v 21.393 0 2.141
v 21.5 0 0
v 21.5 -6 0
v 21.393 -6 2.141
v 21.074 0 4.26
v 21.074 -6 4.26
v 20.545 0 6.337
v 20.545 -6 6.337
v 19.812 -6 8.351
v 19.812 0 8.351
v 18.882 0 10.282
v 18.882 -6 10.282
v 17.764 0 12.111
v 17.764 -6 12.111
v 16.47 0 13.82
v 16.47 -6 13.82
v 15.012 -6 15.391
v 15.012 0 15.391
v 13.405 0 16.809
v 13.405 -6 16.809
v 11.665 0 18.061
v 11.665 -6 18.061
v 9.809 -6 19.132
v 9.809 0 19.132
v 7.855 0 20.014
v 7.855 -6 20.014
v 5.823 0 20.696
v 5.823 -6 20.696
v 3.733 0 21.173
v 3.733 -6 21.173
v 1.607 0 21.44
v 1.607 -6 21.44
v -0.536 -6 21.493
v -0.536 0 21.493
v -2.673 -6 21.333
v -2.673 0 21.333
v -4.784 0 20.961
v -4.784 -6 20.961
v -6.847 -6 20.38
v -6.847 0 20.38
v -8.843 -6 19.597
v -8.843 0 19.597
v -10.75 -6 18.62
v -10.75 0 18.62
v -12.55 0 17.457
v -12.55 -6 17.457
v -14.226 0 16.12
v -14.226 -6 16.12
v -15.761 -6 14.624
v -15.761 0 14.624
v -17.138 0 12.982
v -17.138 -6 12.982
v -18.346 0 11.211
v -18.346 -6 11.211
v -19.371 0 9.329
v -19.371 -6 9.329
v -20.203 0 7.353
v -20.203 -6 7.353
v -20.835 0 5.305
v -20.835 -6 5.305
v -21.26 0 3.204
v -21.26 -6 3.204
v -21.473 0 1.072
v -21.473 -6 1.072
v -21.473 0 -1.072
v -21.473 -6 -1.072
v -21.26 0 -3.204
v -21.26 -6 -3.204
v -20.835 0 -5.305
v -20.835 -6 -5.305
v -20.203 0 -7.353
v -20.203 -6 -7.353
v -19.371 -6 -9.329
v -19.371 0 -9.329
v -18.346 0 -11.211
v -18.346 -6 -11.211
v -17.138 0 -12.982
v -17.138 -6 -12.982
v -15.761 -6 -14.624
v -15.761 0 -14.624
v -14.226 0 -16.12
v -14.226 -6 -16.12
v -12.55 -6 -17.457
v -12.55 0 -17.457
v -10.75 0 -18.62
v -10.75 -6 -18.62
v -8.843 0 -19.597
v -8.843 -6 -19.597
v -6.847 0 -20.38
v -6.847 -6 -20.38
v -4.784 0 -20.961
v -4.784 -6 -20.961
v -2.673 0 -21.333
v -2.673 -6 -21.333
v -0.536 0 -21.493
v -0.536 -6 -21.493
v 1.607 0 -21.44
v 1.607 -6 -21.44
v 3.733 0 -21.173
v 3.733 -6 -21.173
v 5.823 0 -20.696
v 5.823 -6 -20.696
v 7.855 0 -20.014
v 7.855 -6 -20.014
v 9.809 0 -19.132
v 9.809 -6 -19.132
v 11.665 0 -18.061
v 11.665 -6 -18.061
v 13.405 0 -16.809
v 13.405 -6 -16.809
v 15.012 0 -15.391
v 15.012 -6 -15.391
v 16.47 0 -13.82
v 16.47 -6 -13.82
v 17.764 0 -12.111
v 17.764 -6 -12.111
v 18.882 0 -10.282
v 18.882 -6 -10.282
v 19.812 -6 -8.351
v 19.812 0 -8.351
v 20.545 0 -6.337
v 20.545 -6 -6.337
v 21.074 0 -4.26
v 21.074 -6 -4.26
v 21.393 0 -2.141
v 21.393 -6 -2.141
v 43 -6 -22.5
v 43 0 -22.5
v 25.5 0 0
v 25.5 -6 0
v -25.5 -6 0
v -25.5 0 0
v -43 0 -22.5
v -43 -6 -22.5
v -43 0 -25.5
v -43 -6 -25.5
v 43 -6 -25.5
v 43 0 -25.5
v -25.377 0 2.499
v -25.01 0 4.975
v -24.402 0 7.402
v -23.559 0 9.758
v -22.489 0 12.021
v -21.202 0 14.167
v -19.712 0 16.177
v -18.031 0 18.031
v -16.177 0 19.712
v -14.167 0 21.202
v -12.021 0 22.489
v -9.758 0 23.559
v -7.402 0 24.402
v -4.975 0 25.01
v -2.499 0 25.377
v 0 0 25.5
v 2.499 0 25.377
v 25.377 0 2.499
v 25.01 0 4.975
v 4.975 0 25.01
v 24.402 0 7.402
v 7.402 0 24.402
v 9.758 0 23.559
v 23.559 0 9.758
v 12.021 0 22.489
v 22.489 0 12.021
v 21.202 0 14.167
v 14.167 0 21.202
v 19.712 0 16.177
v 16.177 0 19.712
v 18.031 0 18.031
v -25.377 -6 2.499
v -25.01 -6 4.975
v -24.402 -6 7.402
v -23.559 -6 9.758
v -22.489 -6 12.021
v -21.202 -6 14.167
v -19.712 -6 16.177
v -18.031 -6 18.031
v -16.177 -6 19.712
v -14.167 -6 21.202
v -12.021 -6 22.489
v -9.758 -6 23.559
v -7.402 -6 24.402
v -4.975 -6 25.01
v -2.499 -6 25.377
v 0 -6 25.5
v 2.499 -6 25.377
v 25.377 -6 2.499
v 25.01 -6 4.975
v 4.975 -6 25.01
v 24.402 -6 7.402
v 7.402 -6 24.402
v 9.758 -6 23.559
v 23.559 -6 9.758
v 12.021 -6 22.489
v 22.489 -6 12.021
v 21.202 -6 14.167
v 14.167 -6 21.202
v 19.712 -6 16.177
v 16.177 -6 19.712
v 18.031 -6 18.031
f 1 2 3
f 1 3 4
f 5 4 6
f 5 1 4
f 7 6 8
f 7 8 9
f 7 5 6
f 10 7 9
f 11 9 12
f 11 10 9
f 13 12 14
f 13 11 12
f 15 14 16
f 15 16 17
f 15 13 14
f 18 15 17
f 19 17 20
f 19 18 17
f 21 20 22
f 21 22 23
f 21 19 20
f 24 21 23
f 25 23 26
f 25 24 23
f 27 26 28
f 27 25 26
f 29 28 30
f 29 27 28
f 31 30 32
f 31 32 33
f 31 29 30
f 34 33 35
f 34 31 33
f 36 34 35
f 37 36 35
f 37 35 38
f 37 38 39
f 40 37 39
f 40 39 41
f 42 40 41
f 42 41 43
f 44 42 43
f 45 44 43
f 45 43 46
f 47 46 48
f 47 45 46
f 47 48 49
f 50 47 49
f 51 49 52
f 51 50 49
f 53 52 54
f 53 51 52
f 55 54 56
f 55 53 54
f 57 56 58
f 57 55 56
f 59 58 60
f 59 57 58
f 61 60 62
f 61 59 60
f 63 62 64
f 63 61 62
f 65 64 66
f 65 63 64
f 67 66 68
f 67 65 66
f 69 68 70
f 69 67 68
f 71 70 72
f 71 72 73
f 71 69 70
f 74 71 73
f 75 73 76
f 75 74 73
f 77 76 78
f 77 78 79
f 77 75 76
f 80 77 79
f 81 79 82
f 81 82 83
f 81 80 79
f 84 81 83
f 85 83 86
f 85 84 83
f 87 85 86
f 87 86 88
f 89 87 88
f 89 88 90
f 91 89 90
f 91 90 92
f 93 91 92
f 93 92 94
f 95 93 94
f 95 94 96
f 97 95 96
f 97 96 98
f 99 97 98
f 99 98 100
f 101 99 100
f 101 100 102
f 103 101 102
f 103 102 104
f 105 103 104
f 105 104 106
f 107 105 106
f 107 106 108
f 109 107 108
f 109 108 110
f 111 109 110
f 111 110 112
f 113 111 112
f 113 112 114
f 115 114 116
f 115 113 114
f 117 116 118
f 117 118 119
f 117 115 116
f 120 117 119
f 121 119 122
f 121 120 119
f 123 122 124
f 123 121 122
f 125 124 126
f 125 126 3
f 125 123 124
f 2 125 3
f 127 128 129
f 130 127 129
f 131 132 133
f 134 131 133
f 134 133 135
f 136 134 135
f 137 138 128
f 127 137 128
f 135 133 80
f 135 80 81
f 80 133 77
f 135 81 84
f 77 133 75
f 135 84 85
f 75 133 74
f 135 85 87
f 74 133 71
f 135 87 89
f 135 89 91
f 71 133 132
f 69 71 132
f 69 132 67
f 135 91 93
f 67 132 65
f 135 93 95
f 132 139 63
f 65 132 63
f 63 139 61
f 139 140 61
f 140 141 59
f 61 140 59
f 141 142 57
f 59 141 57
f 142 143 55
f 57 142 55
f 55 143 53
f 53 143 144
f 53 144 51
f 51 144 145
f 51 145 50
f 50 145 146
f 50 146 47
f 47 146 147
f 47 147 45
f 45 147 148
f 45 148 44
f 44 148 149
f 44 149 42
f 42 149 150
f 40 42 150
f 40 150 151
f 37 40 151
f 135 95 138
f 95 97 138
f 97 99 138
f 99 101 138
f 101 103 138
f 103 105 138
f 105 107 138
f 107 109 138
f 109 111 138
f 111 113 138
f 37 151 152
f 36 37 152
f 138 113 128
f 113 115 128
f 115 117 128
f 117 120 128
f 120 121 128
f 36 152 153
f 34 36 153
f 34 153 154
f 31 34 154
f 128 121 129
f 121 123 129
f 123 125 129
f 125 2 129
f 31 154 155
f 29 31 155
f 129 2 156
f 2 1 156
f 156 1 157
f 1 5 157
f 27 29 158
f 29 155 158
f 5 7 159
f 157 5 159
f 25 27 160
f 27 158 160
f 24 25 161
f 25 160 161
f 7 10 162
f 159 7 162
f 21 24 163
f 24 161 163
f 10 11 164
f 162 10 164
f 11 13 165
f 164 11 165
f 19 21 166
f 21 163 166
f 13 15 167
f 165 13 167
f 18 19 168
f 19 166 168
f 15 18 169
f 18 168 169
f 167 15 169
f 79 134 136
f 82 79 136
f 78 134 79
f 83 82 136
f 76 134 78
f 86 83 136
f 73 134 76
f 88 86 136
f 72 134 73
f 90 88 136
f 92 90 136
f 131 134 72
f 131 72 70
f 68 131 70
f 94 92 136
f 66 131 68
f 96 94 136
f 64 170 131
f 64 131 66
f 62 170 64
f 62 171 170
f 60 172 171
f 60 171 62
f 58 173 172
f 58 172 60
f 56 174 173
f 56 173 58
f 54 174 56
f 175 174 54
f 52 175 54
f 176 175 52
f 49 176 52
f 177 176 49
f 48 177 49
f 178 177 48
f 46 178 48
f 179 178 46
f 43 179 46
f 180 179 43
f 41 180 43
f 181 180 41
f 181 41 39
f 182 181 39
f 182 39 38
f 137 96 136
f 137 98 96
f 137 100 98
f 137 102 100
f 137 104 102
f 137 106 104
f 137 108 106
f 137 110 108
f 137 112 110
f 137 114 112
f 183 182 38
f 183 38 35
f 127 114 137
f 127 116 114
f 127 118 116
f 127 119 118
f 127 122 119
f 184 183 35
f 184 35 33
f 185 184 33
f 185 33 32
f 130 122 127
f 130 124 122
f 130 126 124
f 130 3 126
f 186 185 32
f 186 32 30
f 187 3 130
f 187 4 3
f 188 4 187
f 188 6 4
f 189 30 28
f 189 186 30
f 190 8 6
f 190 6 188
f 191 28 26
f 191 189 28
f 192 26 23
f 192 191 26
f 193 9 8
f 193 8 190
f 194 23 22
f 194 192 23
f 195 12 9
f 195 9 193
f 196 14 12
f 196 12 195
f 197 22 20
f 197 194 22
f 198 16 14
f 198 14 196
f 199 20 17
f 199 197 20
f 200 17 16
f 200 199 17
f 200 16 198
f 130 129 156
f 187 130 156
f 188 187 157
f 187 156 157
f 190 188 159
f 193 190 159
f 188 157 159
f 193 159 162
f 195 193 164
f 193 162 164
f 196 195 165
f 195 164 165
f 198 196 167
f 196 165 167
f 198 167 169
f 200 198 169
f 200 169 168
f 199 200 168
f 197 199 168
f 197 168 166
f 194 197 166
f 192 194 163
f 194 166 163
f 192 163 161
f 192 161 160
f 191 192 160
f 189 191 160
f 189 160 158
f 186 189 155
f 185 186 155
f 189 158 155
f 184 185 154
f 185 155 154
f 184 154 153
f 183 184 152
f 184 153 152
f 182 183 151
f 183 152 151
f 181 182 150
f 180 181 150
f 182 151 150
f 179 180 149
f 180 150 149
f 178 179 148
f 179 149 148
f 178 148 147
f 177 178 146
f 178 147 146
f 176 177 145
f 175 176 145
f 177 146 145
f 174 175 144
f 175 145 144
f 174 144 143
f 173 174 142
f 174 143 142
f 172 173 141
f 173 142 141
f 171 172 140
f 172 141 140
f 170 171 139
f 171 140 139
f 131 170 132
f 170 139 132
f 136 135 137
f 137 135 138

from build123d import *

# Parameters (mm, degrees)
F0_R     = 21.5
F1_DEPTH = 6


with BuildPart() as f1:
    # F0 (on Front) → F1 (new body)
    with BuildSketch(Plane.XZ):
        with BuildLine():
            Line((-43, -22.5), (-43, -25.5))
            Line((-43, -25.5), (43, -25.5))
            Line((43, -25.5), (43, -22.5))
            Line((43, -22.5), (25.5, 0))
            ThreePointArc((25.5, 0), (0, 25.5), (-25.5, 0))
            Line((-25.5, 0), (-43, -22.5))
        make_face()
        Circle(F0_R, mode=Mode.SUBTRACT)
    extrude(amount=F1_DEPTH)


solid = f1.part
